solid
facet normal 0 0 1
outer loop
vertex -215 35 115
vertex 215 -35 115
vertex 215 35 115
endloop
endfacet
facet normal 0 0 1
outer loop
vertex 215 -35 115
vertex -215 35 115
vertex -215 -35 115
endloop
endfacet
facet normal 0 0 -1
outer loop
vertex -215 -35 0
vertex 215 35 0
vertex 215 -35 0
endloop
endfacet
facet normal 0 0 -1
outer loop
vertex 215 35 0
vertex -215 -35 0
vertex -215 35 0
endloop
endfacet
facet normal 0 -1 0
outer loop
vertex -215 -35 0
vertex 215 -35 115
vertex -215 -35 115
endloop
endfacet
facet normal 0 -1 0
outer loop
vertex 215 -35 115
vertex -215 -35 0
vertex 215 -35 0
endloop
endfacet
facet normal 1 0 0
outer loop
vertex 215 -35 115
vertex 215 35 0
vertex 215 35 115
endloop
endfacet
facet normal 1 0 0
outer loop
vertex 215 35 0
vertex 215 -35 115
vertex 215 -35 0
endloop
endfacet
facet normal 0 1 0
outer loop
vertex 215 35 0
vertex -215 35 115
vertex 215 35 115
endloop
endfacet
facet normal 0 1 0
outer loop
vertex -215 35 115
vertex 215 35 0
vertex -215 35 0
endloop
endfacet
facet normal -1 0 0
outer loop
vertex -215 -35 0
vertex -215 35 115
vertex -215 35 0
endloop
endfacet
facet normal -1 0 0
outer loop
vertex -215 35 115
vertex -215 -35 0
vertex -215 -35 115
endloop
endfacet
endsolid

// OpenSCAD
// Generated documentary F1 envelope proxy.
// Not manufacturing geometry, not dimensionally validated, not SimReady.
proxy_id = "993-INTERCOOLER-PRESSURE-HOSE-LEFT";
$fn = 96;

length_mm = 430;
width_mm = 70;
height_mm = 115;

translate([-length_mm / 2, -width_mm / 2, 0])
    cube([length_mm, width_mm, height_mm], center = false);
